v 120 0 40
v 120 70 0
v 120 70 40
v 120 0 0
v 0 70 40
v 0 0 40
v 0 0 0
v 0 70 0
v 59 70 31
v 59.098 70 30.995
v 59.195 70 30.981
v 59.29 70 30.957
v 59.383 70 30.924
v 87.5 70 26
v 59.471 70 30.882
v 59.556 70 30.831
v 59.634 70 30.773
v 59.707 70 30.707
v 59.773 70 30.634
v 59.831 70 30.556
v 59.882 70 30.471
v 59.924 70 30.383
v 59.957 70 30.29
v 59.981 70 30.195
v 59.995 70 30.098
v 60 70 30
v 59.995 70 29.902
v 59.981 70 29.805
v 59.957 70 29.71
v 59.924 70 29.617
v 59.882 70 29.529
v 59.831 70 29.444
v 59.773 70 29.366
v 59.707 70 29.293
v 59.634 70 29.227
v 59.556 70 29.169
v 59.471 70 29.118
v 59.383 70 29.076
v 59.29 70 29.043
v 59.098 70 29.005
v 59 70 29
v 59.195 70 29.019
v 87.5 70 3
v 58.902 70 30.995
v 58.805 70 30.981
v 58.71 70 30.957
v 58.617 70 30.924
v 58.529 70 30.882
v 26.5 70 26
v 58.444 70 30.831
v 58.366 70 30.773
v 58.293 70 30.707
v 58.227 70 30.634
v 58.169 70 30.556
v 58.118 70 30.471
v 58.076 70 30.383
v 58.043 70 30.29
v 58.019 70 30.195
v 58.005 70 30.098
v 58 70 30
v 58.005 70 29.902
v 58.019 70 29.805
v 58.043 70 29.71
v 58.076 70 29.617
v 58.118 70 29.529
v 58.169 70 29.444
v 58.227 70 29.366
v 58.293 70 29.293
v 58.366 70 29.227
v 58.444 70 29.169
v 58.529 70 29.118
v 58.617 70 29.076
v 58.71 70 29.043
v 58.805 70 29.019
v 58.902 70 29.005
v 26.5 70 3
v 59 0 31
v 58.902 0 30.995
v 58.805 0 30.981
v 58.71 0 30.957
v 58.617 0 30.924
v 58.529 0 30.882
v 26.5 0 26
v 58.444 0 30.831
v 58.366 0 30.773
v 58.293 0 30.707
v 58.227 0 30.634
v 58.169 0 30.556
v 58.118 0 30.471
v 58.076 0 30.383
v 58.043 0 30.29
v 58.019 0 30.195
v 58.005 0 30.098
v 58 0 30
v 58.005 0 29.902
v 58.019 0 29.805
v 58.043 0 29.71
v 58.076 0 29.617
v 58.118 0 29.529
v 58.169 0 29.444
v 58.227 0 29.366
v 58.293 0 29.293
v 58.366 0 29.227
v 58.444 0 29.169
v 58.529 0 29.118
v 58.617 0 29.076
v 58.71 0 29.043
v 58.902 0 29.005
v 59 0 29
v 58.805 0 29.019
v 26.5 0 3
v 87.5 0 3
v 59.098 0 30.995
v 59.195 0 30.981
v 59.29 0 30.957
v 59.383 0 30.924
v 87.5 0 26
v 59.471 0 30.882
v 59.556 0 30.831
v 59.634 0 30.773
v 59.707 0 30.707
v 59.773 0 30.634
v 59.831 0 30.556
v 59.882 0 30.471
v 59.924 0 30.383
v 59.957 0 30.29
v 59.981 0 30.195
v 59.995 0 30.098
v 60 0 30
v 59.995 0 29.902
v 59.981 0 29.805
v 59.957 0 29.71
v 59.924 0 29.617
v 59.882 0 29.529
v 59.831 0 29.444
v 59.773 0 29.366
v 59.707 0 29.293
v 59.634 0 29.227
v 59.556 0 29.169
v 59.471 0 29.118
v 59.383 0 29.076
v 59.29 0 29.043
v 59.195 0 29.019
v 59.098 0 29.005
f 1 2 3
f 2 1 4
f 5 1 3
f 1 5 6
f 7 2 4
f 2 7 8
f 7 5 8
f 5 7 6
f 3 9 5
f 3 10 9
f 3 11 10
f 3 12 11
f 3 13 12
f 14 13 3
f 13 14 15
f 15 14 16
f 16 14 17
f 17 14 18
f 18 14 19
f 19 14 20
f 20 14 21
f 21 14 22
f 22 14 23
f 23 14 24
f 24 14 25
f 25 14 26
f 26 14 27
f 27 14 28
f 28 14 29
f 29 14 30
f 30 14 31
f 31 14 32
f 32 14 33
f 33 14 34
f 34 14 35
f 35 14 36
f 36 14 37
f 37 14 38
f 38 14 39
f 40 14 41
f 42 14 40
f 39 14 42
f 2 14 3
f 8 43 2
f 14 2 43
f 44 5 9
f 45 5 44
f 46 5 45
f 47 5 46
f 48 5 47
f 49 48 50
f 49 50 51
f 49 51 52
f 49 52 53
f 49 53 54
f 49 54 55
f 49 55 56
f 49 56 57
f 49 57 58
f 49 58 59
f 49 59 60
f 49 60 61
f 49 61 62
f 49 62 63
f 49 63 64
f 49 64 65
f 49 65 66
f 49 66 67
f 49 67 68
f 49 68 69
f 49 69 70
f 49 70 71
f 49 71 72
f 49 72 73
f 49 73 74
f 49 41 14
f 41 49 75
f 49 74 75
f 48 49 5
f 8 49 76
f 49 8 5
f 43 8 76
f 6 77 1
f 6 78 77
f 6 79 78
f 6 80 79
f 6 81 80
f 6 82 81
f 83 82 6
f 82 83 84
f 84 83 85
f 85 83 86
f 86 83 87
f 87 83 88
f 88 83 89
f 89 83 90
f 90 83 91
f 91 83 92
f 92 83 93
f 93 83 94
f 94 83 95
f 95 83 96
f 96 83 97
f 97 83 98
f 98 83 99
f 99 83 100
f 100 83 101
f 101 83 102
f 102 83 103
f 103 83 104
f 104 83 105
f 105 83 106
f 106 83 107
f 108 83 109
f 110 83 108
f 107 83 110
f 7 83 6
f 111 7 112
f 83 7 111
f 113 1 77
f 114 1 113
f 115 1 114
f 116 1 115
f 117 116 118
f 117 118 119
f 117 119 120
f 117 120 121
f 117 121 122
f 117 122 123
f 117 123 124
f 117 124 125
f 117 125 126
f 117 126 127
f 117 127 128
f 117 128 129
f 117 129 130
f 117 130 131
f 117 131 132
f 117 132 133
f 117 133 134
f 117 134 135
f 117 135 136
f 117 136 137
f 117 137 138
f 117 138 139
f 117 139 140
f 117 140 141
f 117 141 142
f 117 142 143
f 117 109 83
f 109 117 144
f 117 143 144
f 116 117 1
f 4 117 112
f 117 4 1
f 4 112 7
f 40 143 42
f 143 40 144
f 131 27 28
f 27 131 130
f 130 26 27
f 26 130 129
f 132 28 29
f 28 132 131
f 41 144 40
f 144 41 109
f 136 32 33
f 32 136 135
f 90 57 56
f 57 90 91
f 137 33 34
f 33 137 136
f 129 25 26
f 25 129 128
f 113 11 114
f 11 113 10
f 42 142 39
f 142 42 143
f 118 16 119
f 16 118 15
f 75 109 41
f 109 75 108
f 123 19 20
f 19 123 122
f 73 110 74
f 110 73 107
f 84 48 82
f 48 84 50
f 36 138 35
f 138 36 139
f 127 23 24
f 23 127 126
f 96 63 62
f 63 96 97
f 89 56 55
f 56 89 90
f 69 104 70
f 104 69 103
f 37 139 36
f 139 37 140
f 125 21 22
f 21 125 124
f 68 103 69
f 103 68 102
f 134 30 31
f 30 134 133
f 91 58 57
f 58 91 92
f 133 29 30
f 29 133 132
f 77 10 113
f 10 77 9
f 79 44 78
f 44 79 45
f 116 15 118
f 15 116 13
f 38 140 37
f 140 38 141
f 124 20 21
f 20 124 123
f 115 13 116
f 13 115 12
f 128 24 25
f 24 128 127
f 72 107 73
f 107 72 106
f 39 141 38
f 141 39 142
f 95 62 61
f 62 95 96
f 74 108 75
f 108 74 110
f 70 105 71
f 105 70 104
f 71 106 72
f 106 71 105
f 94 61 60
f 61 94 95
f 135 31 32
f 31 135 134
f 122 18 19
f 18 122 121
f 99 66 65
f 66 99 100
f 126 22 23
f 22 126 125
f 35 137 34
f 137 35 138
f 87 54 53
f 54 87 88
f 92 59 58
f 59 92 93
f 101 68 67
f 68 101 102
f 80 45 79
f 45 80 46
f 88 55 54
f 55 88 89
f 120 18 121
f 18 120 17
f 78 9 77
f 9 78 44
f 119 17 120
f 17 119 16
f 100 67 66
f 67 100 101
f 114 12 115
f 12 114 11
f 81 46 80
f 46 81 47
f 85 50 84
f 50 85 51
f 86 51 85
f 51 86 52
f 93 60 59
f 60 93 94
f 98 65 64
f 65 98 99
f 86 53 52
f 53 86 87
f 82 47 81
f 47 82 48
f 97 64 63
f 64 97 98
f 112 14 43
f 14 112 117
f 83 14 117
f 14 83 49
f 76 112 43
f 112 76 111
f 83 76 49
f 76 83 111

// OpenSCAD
// Buffer tank for mini horizontal gel-electrophoresis box
// Units: mm. Print orientation: open top, resting on XY plane at z = 0.

$fn = 64;

// ---- Tank ----
outer_x      = 120;   // tank outer length (X)
outer_y      = 70;    // tank outer width (Y)
tank_h       = 40;    // tank outer height (Z)
wall         = 3;     // tank wall thickness
floor_t      = 3;     // tank floor thickness

// ---- Gel-tray platform ----
plat_x       = 60;    // platform length in X (centred)
plat_y       = 70;    // platform width in Y (full inner width)
plat_top_z   = 13;    // platform top height above inner floor
                // (note: user gave z = 13 even though inner floor is at z = 3)

// ---- Electrode holes ----
hole_d       = 2;     // electrode hole diameter
hole_y       = 0;     // electrode hole Y position
hole_z       = 30;    // electrode hole Z position

// ---- Misc ----
eps          = 0.5;   // cutter overshoot past faces

// Inner dimensions
inner_x = outer_x - 2*wall;
inner_z = tank_h - floor_t;

// Platform legs (simplified) extending from top down to the floor
leg_h = plat_top_z + floor_t;

difference() {
    union() {
        // Tank body
        cube([outer_x, outer_y, tank_h]);
        // Raised platform
        translate([(outer_x - plat_x)/2, 0, plat_top_z])
            cube([plat_x, plat_y, leg_h]);
    }

    // Chamber divider: runs along Y, sits on top of the floor,
    // leaving an open gap above the platform so the chambers connect.
    translate([(inner_x - plat_x)/2 - eps, 0, floor_t])
        cube([plat_x + 2*eps, outer_y, inner_z - plat_top_z - 1]);

    // Electrode wires: horizontal holes along X through each end wall
    for (s = [-1, 1])
        translate([s * (outer_x/2 - hole_d/2), hole_y, hole_z])
            rotate([-90, 0, 0]) cylinder(d = hole_d, h = outer_x + 2*eps);
}
